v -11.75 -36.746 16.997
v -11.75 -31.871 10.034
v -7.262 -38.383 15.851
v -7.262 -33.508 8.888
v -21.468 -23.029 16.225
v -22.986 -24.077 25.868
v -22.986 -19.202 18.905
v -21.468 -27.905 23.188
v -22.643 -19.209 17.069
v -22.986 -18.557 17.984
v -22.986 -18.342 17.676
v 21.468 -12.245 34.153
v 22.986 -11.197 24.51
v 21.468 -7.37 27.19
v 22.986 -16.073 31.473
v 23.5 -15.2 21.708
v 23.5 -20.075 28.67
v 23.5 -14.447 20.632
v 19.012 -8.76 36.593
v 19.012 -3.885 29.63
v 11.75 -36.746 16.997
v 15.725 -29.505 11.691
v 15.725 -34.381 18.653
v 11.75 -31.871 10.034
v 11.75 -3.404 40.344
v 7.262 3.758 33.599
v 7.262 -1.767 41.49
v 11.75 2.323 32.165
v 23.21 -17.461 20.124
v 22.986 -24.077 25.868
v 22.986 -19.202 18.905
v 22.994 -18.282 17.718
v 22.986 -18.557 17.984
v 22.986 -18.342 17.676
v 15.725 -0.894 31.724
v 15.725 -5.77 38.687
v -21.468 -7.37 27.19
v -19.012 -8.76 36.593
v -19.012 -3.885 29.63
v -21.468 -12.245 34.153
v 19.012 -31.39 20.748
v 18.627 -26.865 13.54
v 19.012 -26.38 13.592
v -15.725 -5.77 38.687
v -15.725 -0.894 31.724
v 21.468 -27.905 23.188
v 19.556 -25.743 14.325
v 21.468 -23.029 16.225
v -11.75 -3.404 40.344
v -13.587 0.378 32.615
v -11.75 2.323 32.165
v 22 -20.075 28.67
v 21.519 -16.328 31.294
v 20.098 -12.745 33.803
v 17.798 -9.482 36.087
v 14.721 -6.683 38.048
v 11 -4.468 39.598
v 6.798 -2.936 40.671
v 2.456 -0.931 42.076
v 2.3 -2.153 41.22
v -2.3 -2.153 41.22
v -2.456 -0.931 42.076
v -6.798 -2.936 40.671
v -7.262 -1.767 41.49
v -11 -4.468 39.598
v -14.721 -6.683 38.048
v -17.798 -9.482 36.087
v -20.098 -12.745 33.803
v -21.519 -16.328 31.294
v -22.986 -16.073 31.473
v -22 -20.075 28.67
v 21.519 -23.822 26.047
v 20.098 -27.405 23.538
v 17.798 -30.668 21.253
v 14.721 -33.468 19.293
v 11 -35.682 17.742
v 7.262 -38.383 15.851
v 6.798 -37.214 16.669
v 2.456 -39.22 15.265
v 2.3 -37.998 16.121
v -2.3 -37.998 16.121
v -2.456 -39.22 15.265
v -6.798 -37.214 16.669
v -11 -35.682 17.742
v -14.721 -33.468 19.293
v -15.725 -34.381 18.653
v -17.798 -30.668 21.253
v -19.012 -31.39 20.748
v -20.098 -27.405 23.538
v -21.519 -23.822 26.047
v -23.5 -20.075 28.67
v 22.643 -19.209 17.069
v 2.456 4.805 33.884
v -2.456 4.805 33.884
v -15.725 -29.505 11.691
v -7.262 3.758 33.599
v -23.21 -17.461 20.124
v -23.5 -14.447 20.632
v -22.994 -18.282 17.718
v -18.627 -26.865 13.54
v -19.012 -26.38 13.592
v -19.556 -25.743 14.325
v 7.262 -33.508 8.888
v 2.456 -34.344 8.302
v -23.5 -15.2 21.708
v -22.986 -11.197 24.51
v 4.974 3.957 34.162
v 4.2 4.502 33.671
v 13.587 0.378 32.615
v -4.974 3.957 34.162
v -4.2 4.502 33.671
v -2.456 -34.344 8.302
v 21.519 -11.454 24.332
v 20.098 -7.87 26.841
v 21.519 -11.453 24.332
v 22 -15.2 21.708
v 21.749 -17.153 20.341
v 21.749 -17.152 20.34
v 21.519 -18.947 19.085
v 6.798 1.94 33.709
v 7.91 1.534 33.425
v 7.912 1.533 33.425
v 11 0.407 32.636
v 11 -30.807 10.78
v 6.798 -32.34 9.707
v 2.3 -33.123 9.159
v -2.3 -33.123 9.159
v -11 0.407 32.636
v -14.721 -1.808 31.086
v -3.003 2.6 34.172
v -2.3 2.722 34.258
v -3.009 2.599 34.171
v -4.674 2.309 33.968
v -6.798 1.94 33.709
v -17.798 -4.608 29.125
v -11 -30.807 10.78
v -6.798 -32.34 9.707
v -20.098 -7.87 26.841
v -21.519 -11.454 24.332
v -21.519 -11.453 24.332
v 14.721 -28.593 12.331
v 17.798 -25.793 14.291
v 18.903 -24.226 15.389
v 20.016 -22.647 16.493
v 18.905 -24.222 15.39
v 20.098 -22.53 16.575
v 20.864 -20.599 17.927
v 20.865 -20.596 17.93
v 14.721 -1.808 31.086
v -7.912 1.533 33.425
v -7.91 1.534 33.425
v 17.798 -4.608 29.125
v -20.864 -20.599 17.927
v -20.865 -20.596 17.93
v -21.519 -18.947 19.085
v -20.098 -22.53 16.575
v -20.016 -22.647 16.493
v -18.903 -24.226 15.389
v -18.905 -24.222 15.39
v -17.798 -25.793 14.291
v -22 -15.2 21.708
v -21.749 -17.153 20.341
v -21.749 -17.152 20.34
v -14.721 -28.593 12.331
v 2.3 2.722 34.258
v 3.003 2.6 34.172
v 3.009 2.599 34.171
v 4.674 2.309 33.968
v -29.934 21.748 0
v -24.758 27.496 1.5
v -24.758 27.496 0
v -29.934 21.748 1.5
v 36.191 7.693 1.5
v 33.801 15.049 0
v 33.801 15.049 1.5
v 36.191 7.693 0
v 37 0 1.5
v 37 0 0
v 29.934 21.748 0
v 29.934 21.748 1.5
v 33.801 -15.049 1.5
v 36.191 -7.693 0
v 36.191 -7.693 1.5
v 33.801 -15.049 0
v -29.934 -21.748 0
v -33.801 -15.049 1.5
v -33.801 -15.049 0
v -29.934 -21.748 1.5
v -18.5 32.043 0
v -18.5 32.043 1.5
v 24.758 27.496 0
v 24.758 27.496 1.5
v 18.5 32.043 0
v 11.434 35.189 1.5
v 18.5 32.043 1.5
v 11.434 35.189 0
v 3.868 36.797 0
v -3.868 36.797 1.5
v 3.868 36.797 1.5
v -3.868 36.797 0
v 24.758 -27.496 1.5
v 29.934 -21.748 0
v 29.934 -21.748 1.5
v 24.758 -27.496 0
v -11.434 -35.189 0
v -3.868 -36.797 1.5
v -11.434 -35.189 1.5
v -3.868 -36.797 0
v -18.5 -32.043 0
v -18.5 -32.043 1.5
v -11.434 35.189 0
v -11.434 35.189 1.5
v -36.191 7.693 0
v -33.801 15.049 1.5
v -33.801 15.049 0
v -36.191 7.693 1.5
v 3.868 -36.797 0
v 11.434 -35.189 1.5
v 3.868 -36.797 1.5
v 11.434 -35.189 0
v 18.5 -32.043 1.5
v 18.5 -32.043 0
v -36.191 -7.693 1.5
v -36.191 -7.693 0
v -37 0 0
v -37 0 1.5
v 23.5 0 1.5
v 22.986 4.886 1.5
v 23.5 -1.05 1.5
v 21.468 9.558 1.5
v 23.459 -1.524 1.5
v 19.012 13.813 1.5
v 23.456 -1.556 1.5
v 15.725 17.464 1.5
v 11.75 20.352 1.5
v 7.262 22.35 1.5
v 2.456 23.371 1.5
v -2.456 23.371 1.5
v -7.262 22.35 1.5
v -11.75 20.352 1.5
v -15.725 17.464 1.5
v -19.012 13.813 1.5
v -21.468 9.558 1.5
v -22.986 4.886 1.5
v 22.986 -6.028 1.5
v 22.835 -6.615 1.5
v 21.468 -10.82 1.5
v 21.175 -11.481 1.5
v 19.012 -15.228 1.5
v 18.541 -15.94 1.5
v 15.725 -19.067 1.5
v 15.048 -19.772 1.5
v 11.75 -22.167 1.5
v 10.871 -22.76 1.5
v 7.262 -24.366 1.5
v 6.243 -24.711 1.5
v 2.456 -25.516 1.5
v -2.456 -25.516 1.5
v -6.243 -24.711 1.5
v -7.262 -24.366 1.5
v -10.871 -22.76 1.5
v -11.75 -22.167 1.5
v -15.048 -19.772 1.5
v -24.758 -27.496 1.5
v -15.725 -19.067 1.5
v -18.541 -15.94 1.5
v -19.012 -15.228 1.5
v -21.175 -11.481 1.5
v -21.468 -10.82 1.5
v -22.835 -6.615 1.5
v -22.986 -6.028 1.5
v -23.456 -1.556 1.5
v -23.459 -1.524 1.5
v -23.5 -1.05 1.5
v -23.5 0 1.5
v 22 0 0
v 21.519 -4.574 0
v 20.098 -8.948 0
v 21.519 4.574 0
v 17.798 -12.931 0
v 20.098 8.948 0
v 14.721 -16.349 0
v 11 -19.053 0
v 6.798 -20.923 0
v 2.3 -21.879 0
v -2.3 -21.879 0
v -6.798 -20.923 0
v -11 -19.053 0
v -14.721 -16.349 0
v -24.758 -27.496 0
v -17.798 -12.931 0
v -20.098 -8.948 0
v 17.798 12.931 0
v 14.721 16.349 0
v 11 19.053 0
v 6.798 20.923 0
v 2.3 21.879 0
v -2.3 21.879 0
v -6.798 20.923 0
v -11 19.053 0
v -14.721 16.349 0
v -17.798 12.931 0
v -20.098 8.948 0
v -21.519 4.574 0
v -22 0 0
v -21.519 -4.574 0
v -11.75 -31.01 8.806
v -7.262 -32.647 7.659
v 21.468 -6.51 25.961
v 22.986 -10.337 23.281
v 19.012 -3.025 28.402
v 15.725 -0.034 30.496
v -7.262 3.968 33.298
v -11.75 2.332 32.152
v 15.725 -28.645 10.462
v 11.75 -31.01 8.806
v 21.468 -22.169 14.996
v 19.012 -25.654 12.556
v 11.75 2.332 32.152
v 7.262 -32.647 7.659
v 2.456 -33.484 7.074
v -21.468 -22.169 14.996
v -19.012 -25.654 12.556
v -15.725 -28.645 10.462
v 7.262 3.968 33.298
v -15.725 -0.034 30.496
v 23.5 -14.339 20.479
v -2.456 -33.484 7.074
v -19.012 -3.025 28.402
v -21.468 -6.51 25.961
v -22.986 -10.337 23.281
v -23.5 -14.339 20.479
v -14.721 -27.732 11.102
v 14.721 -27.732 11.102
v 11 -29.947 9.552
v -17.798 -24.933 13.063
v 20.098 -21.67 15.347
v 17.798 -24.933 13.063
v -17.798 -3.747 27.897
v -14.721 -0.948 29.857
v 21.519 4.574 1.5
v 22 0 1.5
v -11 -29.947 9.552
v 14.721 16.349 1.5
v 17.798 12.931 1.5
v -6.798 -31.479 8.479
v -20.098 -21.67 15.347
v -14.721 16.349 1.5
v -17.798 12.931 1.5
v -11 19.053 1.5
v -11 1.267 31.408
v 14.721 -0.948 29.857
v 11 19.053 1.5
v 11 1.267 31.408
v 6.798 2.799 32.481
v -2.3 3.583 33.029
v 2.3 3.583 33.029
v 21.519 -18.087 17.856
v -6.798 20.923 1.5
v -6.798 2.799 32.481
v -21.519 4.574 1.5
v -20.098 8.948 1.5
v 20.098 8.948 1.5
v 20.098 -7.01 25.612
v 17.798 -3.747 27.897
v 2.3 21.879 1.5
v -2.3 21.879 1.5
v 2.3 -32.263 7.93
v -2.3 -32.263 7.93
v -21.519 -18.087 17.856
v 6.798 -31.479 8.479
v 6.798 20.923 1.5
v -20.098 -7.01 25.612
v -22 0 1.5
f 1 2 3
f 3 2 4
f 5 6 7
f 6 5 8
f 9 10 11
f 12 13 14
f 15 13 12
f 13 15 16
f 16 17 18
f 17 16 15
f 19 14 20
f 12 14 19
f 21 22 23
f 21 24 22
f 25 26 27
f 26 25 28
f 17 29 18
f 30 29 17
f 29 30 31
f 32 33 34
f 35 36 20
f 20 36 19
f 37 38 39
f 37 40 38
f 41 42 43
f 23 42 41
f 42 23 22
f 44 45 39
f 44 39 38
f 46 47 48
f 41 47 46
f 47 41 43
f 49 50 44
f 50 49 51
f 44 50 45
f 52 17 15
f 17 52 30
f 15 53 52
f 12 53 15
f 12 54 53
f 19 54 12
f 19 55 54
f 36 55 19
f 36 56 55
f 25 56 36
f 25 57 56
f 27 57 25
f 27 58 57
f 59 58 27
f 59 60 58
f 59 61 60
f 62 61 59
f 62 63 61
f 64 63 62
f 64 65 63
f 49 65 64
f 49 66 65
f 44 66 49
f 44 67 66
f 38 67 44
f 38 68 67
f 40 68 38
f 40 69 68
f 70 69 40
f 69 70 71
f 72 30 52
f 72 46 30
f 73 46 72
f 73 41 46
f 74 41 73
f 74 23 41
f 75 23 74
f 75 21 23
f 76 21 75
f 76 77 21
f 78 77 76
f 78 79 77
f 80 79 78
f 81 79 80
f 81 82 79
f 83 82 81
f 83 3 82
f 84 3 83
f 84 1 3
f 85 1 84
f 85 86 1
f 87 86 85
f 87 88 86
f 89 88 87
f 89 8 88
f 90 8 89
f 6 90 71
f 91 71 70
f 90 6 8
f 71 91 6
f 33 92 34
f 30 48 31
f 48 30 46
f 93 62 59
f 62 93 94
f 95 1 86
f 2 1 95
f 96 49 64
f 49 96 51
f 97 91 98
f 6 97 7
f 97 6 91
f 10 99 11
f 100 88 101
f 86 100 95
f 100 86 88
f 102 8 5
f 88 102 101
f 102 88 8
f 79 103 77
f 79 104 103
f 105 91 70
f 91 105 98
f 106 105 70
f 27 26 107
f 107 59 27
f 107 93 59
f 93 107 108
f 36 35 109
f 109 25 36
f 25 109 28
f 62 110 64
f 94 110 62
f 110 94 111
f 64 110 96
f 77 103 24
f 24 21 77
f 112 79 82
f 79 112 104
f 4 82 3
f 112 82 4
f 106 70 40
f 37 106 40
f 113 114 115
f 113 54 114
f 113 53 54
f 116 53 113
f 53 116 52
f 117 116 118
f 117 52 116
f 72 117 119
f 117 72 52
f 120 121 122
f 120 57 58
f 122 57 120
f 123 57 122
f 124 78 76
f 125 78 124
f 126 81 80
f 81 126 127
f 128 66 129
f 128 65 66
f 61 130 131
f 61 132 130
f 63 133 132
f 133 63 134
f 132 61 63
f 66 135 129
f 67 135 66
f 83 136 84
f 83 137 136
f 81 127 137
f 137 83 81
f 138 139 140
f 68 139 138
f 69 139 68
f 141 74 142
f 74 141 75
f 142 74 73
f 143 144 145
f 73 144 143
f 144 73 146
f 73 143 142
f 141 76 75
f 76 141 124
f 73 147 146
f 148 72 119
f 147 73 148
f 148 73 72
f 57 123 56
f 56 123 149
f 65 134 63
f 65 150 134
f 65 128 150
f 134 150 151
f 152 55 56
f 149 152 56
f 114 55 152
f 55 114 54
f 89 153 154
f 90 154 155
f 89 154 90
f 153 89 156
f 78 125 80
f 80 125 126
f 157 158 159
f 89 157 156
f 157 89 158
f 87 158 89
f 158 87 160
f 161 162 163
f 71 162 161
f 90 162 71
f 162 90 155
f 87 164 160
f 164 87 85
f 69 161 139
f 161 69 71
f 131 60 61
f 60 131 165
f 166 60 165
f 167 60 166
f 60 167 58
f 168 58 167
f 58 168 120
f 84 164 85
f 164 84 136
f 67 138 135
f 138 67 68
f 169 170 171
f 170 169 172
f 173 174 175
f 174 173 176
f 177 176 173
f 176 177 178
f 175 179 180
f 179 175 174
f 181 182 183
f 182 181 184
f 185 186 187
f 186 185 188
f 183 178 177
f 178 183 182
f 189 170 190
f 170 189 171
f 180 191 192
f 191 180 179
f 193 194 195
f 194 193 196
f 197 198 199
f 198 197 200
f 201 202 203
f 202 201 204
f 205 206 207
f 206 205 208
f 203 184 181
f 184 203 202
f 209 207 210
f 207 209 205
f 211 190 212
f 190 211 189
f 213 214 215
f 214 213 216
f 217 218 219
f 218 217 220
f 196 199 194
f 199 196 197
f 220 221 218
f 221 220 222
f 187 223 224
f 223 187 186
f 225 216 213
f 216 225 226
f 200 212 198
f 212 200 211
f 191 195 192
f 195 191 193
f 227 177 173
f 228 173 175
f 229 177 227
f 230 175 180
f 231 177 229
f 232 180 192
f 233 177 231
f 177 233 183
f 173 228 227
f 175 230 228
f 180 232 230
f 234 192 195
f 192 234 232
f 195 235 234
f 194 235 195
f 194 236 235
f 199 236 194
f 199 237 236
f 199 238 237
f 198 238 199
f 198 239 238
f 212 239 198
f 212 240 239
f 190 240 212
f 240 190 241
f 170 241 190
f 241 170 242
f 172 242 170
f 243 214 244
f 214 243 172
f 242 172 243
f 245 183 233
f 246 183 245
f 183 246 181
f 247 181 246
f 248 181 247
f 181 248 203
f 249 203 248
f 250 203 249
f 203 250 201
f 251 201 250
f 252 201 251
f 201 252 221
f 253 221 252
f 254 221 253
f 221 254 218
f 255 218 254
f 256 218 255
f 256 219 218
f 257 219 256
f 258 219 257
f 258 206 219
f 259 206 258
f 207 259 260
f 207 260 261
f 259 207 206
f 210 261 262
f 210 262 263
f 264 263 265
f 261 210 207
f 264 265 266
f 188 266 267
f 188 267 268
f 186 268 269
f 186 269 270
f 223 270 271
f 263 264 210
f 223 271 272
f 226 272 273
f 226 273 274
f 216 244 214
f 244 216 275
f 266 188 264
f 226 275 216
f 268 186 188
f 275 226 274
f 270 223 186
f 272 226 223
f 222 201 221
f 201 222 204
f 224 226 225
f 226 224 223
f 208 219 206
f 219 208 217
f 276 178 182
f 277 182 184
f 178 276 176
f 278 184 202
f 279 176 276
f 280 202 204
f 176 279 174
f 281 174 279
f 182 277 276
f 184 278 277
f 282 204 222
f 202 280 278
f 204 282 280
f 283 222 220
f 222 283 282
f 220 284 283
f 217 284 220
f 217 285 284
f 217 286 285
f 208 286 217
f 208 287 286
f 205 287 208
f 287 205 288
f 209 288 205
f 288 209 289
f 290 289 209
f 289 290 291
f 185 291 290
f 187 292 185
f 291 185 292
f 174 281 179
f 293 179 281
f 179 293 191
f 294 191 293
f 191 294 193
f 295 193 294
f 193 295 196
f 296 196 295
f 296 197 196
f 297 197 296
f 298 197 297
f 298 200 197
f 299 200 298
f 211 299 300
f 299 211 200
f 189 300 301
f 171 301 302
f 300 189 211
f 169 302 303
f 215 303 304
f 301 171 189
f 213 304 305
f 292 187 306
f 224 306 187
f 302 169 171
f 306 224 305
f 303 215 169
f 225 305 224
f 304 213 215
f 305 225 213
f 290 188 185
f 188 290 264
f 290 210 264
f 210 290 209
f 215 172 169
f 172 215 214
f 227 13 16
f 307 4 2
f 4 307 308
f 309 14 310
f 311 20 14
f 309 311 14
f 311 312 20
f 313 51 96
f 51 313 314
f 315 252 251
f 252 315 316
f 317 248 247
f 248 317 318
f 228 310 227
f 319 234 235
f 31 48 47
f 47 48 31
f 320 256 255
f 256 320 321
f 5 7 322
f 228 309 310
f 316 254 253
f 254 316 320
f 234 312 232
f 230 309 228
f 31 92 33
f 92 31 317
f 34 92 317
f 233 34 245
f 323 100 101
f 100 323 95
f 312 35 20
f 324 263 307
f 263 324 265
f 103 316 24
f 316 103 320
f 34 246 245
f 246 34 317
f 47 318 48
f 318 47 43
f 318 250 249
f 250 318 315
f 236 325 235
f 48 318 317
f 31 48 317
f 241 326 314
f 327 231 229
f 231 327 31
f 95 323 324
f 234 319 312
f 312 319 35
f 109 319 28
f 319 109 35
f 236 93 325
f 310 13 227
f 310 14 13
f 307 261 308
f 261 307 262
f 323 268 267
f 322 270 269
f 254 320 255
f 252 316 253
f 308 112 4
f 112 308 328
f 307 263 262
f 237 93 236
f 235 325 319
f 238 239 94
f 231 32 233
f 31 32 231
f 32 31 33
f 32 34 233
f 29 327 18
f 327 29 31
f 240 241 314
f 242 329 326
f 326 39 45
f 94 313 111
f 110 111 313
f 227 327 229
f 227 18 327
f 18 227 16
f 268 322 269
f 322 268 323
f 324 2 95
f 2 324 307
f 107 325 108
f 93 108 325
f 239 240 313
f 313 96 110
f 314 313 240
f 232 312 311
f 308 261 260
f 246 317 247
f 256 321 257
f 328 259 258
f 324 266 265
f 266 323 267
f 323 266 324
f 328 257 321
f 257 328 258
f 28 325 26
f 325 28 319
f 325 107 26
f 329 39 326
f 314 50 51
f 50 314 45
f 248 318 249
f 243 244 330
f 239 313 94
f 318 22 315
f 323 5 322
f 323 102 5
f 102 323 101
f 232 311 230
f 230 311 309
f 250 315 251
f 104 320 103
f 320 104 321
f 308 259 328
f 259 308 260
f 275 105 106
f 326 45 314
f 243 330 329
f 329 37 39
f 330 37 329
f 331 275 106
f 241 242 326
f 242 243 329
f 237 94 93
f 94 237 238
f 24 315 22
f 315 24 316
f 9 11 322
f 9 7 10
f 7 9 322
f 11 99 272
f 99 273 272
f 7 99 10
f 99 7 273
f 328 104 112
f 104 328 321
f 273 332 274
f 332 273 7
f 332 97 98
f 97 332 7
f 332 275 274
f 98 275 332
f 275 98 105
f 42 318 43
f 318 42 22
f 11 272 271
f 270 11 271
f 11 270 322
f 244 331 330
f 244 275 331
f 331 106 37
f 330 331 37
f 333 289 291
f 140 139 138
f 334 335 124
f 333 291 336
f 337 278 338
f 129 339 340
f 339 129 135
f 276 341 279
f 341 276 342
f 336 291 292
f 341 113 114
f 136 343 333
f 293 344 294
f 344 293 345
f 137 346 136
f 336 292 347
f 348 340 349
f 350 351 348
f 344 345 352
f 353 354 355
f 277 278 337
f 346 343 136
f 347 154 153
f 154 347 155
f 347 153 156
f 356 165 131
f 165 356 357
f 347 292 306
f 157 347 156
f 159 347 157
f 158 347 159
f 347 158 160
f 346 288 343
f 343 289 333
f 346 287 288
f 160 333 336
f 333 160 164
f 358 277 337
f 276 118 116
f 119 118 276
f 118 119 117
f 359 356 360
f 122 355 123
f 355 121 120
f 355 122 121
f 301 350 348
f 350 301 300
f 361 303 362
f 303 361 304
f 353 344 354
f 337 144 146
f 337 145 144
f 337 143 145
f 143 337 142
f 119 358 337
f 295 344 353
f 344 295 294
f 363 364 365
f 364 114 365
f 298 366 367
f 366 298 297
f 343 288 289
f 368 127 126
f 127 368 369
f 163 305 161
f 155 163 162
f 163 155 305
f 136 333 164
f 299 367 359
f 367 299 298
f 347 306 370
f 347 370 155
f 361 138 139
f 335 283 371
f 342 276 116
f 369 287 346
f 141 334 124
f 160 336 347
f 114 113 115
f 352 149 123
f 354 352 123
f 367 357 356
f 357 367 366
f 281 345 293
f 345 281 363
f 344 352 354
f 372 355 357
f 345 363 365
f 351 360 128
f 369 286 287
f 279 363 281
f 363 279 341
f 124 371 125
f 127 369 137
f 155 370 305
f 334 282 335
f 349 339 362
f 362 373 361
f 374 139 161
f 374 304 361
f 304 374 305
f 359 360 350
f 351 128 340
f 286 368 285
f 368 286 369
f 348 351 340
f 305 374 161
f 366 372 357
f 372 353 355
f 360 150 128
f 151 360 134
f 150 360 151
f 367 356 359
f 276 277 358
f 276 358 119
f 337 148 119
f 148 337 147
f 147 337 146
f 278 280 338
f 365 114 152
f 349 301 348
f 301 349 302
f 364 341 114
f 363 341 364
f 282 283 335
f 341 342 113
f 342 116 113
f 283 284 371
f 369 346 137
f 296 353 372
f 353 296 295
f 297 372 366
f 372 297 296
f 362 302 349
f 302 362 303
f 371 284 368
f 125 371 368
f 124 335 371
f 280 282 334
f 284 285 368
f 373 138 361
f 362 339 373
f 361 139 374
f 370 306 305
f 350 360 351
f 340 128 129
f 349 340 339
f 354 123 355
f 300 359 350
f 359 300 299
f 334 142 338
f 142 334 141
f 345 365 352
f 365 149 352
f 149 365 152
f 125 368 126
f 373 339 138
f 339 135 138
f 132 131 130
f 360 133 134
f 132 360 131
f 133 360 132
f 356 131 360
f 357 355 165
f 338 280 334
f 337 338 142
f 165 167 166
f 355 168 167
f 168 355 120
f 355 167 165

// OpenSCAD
module connector_square(
    out_l,
    in_r,
    h,
    flange,
    thickness,
    angle = 0,
    angle_v = [0,0,0],
    connector_h = 0
) {
    difference() {
        union() {
            hull() {
                cube([(out_l + thickness), (out_l + thickness), thickness], center=true);
                rotate(angle, angle_v)
                translate(v = [0,0,h])
                cylinder(h = thickness, r = in_r + thickness);
            }
            // connector
            translate([0,0,h])
            difference() {
                cylinder(h = connector_h, r = in_r + thickness);
                cylinder(h = connector_h, r = in_r);
            }
        }
        hull() {
            cube([out_l, out_l, thickness], center=true);
            rotate(angle, angle_v)
            translate(v = [0,0,h + .001])
            cylinder(h = thickness, r = in_r);
        }
    }
    // flange
    difference() {
        cube([out_l + flange * 2, out_l + flange * 2, thickness], center=true);
        cube([out_l, out_l, thickness], center=true);
    }
}

module connector(
    out_r,
    in_r,
    h,
    flange,
    thickness,
    angle = 0,
    connector_h = 0
) {
    difference() {
        union() {
            hull() {
                cylinder(h = thickness, r = out_r + thickness);
                rotate(angle, [1,0,0])
                translate(v = [0,0,h])
                cylinder(h = thickness, r = in_r + thickness);
            }
            // connector
            rotate(angle, [1,0,0])
            translate([0,0,h])
            difference() {
                cylinder(h = connector_h, r = in_r + thickness);
                cylinder(h = connector_h, r = in_r);
            }
            // flange
            difference() {
                cylinder(h = thickness, r = out_r + flange);
                cylinder(h = thickness, r = out_r);
            }
        }
        hull() {
            cylinder(h = thickness, r = out_r);
            rotate(angle, [1,0,0])
            translate(v = [0,0,h + .001])
            cylinder(h = thickness, r = in_r);
        }
    }
}

connector(
    out_r = 22,
    in_r = 22,
    h = 25,
    flange = 15,
    thickness = 1.5,
    angle = 35,
    connector_h = 10
 );

// connector(
//     out_r = 27,
//     in_r = 27,
//     h = 27,
//     flange = 15,
//     thickness = 1.5,
//     angle = 35,
//     connector_h = 10
// );

// connector_square(
//     out_l = 55,
//     in_r = 21,
//     h = 25,
//     angle = 0,
//     angle_v = [1,1,0],
//     thickness = 2,
//     flange = 15,
//     connector_h = 10
// );
